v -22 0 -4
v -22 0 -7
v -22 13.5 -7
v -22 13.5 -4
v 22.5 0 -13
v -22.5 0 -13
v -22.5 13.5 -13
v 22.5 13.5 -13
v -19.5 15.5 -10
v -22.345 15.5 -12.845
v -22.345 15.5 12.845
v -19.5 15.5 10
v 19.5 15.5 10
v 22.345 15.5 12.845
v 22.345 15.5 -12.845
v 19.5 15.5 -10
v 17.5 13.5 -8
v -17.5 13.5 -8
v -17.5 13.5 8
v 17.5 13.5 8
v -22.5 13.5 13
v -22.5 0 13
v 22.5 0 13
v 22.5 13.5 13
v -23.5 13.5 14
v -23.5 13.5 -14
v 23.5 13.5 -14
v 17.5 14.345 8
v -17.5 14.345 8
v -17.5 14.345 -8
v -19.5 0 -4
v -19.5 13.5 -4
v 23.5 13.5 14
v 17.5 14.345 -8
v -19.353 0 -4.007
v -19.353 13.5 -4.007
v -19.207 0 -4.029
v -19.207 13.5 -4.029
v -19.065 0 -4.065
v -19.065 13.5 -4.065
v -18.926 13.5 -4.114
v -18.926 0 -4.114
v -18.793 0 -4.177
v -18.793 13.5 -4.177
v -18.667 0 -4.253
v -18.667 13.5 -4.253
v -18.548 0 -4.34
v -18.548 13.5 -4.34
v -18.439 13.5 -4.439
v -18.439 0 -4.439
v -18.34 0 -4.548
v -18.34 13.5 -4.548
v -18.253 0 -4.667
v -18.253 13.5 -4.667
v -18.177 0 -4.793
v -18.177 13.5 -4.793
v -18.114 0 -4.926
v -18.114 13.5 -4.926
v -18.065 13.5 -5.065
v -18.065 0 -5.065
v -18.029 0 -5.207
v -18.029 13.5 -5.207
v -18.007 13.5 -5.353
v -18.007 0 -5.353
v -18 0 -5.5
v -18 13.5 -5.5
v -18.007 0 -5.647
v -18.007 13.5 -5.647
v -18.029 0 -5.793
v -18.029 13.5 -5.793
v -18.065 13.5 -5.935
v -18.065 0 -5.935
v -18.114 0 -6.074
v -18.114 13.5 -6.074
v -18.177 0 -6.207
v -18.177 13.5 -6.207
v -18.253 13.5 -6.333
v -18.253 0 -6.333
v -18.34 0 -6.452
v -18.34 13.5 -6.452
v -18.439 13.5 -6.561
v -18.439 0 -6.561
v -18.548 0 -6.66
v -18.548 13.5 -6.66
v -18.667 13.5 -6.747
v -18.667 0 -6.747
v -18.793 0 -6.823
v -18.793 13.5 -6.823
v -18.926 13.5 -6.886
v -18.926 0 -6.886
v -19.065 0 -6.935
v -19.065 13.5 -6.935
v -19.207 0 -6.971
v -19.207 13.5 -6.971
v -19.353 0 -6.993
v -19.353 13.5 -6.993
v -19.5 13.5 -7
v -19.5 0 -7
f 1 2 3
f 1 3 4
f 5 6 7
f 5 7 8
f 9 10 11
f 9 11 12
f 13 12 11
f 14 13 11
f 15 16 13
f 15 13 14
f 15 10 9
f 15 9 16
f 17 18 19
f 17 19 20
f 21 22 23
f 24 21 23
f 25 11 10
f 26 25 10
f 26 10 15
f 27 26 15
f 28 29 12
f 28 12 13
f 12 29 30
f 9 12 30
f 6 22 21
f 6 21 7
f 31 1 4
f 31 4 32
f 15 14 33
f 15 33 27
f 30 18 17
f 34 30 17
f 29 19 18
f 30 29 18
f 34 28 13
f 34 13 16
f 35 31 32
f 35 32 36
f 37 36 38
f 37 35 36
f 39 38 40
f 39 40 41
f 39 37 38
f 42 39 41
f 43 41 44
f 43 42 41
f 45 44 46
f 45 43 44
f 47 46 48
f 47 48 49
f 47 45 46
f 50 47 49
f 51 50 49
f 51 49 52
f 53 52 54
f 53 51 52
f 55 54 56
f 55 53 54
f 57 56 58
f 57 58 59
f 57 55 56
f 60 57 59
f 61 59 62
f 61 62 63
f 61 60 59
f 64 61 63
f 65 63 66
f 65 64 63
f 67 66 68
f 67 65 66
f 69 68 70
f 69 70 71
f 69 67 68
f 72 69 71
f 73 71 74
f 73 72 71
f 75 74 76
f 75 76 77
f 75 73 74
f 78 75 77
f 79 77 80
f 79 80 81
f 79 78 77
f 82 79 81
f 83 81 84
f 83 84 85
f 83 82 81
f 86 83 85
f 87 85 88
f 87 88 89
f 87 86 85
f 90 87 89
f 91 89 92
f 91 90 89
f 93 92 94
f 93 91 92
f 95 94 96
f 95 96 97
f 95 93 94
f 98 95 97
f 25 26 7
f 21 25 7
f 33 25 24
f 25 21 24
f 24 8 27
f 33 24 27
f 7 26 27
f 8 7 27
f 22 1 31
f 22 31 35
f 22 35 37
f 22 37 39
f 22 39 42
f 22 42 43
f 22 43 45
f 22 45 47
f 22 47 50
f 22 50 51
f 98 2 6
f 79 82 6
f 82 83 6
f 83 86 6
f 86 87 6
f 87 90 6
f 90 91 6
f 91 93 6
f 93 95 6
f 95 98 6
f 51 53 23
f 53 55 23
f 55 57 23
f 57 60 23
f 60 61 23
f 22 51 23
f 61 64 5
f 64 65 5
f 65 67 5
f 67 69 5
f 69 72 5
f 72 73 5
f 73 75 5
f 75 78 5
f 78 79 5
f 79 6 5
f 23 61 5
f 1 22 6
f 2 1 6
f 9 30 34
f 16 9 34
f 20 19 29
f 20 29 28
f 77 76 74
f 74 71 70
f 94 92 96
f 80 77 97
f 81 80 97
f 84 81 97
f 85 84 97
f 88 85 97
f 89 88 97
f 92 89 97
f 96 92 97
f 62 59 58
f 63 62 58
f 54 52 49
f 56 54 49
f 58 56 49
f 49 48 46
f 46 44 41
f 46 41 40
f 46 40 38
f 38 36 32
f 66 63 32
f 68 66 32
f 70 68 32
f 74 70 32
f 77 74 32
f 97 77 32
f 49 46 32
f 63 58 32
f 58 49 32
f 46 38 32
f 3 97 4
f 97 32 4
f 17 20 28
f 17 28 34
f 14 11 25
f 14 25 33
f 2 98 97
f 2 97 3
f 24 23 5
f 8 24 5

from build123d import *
from OCP.BRepFilletAPI import BRepFilletAPI_MakeChamfer

# Parameters (mm, degrees)
SKETCH1_W           = 45
SKETCH1_H           = 26
BOSS_EXTRUDE1_DEPTH = 13.5
SKETCH2_W           = 47
SKETCH2_H           = 28
SKETCH2_W_2         = 35
SKETCH2_H_2         = 16
BOSS_EXTRUDE2_DEPTH = 2
CHAMFER1_SIZE       = 2
CHAMFER1_SIZE_2     = 1.154700538
CUT_EXTRUDE1_DEPTH  = 13.5


with BuildPart() as part:
    # Sketch1 → Boss-Extrude1 (new body)
    with BuildSketch(Plane(origin=(0, 0, 0), x_dir=(1, 0, 0), z_dir=(0, 1, 0))):
        Rectangle(SKETCH1_W, SKETCH1_H)
    extrude(amount=BOSS_EXTRUDE1_DEPTH)

    # Sketch2 → Boss-Extrude2 (add)
    with BuildSketch(Plane(origin=(0, 13.5, 0), x_dir=(1, 0, 0), z_dir=(0, 1, 0))):
        Rectangle(SKETCH2_W, SKETCH2_H)
        Rectangle(SKETCH2_W_2, SKETCH2_H_2, mode=Mode.SUBTRACT)
    extrude(amount=BOSS_EXTRUDE2_DEPTH)

    # Chamfer1
    chamfer1_edges_1 = [part.edges().sort_by_distance(p)[0] for p in [
        (0, 15.5, -8),
    ]]
    chamfer1_side_1 = [part.faces().sort_by_distance(p)[0] for p in [
        (0, 15.5, -8.023094011),
    ]]
    chamfer1_edges_2 = [part.edges().sort_by_distance(p)[0] for p in [
        (-17.5, 15.5, 0),
    ]]
    chamfer1_side_2 = [part.faces().sort_by_distance(p)[0] for p in [
        (-17.523094011, 15.5, 0),
    ]]
    chamfer1_edges_3 = [part.edges().sort_by_distance(p)[0] for p in [
        (0, 15.5, 8),
    ]]
    chamfer1_side_3 = [part.faces().sort_by_distance(p)[0] for p in [
        (0, 15.5, 8.023094011),
    ]]
    chamfer1_edges_4 = [part.edges().sort_by_distance(p)[0] for p in [
        (17.5, 15.5, 0),
    ]]
    chamfer1_side_4 = [part.faces().sort_by_distance(p)[0] for p in [
        (17.523094011, 15.5, 0),
    ]]
    chamfer1_edges_5 = [part.edges().sort_by_distance(p)[0] for p in [
        (-23.5, 15.5, 0),
    ]]
    chamfer1_side_5 = [part.faces().sort_by_distance(p)[0] for p in [
        (-23.5, 15.476905989, 0),
    ]]
    chamfer1_edges_6 = [part.edges().sort_by_distance(p)[0] for p in [
        (0, 15.5, -14),
    ]]
    chamfer1_side_6 = [part.faces().sort_by_distance(p)[0] for p in [
        (0, 15.476905989, -14),
    ]]
    chamfer1_edges_7 = [part.edges().sort_by_distance(p)[0] for p in [
        (23.5, 15.5, 0),
    ]]
    chamfer1_side_7 = [part.faces().sort_by_distance(p)[0] for p in [
        (23.5, 15.476905989, 0),
    ]]
    chamfer1_edges_8 = [part.edges().sort_by_distance(p)[0] for p in [
        (0, 15.5, 14),
    ]]
    chamfer1_side_8 = [part.faces().sort_by_distance(p)[0] for p in [
        (0, 15.476905989, 14),
    ]]
    chamfer1 = BRepFilletAPI_MakeChamfer(part.part.solid().wrapped)
    for e in chamfer1_edges_1:
        chamfer1.Add(CHAMFER1_SIZE - 0.0001, CHAMFER1_SIZE_2 - 0.0001, e.wrapped, chamfer1_side_1[0].wrapped)
    for e in chamfer1_edges_2:
        chamfer1.Add(CHAMFER1_SIZE - 0.0001, CHAMFER1_SIZE_2 - 0.0001, e.wrapped, chamfer1_side_2[0].wrapped)
    for e in chamfer1_edges_3:
        chamfer1.Add(CHAMFER1_SIZE - 0.0001, CHAMFER1_SIZE_2 - 0.0001, e.wrapped, chamfer1_side_3[0].wrapped)
    for e in chamfer1_edges_4:
        chamfer1.Add(CHAMFER1_SIZE - 0.0001, CHAMFER1_SIZE_2 - 0.0001, e.wrapped, chamfer1_side_4[0].wrapped)
    for e in chamfer1_edges_5:
        chamfer1.Add(CHAMFER1_SIZE - 0.0001, CHAMFER1_SIZE_2 - 0.0001, e.wrapped, chamfer1_side_5[0].wrapped)
    for e in chamfer1_edges_6:
        chamfer1.Add(CHAMFER1_SIZE - 0.0001, CHAMFER1_SIZE_2 - 0.0001, e.wrapped, chamfer1_side_6[0].wrapped)
    for e in chamfer1_edges_7:
        chamfer1.Add(CHAMFER1_SIZE - 0.0001, CHAMFER1_SIZE_2 - 0.0001, e.wrapped, chamfer1_side_7[0].wrapped)
    for e in chamfer1_edges_8:
        chamfer1.Add(CHAMFER1_SIZE - 0.0001, CHAMFER1_SIZE_2 - 0.0001, e.wrapped, chamfer1_side_8[0].wrapped)
    add(Compound.cast(chamfer1.Shape()), mode=Mode.REPLACE)  # a hair under: the kernel refuses the full size

    # Sketch3 → Cut-Extrude1 (cut)
    with BuildSketch(Plane.XZ):
        with BuildLine():
            Line((-22, -4), (-19.5, -4))
            ThreePointArc((-19.5, -4), (-18, -5.5), (-19.5, -7))
            Line((-19.5, -7), (-22, -7))
            Line((-22, -7), (-22, -4))
        make_face()
    extrude(amount=-CUT_EXTRUDE1_DEPTH, mode=Mode.SUBTRACT)


solid = part.part
